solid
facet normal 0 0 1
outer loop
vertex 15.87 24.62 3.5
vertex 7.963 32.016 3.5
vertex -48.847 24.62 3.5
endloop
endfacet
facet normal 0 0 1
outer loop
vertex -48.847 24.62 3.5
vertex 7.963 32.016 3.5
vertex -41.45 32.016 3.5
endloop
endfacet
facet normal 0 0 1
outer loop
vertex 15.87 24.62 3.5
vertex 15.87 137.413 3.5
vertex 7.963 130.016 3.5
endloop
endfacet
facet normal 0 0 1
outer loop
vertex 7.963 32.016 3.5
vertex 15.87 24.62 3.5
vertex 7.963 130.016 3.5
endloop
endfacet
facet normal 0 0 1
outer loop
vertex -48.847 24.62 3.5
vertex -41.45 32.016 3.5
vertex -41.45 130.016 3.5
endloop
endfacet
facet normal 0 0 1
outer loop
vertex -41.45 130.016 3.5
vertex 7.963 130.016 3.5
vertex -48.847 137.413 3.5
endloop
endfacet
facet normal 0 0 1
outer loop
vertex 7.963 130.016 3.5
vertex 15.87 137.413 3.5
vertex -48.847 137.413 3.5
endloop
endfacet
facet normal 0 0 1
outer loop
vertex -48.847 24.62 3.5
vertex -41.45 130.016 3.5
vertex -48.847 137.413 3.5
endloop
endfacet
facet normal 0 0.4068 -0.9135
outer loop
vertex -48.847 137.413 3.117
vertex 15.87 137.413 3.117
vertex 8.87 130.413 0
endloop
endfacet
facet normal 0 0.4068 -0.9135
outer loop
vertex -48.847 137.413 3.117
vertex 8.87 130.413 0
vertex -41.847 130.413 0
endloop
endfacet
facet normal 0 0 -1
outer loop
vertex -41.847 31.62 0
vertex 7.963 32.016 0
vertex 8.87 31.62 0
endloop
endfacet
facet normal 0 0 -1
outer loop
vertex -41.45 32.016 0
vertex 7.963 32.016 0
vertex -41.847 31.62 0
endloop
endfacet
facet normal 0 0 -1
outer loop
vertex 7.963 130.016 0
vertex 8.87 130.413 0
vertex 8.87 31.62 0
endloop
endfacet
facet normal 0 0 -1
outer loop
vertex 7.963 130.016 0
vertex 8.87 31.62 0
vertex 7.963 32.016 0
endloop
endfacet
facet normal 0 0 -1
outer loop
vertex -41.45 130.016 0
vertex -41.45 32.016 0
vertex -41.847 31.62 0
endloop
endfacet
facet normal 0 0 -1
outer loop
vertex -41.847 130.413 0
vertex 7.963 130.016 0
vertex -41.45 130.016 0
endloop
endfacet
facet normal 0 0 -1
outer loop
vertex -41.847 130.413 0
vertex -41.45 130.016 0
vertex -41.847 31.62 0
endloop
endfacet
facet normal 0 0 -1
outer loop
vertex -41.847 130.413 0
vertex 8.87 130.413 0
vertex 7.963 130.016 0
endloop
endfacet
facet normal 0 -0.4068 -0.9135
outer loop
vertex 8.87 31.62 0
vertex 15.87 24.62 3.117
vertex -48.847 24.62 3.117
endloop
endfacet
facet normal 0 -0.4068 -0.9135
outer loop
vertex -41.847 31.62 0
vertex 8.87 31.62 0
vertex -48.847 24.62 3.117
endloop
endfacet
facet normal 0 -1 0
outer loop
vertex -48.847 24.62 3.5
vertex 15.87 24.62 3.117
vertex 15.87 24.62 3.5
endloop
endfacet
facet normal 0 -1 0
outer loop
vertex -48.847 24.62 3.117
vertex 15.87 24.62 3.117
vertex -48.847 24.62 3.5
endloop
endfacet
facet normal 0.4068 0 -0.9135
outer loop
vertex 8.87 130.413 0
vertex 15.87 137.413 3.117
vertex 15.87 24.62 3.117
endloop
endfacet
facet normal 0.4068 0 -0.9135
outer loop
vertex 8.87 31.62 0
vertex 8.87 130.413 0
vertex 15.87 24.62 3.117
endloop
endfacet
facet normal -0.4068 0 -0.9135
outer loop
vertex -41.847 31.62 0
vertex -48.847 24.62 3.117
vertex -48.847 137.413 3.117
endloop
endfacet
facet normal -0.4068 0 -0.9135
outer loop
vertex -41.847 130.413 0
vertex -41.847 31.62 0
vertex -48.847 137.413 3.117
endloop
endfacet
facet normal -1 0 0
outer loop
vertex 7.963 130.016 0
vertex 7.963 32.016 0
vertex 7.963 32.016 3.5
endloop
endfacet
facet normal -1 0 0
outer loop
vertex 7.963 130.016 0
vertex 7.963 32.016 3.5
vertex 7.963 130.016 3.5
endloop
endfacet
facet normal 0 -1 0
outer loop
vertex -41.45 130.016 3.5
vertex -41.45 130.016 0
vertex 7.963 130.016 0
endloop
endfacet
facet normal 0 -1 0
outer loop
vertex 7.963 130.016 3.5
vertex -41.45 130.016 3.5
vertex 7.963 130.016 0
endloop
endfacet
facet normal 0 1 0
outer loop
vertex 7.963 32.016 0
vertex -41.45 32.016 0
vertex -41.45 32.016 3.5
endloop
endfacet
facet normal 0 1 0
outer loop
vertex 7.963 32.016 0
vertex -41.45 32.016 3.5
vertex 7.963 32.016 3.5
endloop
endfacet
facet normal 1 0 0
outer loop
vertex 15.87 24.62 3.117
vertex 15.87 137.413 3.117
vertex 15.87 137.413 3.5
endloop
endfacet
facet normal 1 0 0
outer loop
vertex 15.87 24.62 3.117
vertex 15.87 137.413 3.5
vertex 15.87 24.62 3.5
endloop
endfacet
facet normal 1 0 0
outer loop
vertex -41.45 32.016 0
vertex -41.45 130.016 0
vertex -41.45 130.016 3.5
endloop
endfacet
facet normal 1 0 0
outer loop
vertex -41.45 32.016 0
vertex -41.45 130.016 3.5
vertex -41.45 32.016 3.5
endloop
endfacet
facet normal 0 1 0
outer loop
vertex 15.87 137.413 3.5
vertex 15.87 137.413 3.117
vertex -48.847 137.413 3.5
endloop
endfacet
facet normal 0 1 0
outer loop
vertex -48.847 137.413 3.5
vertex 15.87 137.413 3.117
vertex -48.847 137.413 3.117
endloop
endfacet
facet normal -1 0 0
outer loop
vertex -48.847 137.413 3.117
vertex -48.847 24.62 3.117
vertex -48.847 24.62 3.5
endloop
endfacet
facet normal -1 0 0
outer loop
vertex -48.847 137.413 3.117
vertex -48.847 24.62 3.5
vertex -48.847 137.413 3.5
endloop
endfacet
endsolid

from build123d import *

# Parameters (mm, degrees)
BOSS_EXTRUDE1_DEPTH = 3.5
CHAMFER1_SIZE       = 7
CHAMFER1_SIZE2      = 3.116600797


with BuildPart() as part:
    # Sketch1 → Boss-Extrude1 (new body)
    with BuildSketch(Plane.XY):
        Polygon((7.962573201, 32.016439516), (15.870478339, 24.620213101), (-48.846502793, 24.620213101), (-41.450276378, 32.016439516), align=None)
        Polygon((-48.846502793, 137.412665932), (-41.450276378, 130.016439516), (-41.450276378, 32.016439516), (-48.846502793, 24.620213101), align=None)
        Polygon((15.870478339, 137.412665932), (-48.846502793, 137.412665932), (-41.450276378, 130.016439516), (7.962573201, 130.016439516), align=None)
        Polygon((15.870478339, 137.412665932), (15.870478339, 24.620213101), (7.962573201, 32.016439516), (7.962573201, 130.016439516), align=None)
    extrude(amount=BOSS_EXTRUDE1_DEPTH)

    # Chamfer1
    chamfer1_edges = [part.edges().sort_by_distance(p)[0] for p in [
        (-48.846502793, 81.016439516, 0),
        (-16.488012227, 137.412665932, 0),
        (15.870478339, 81.016439516, 0),
        (-16.488012227, 24.620213101, 0),
    ]]
    chamfer1_side = [part.faces().sort_by_distance(p)[0] for p in [
        (-16.488012227, 25.920614003, 0),
    ]]
    chamfer(chamfer1_edges, length=CHAMFER1_SIZE, length2=CHAMFER1_SIZE2, reference=chamfer1_side[0])


solid = part.part
